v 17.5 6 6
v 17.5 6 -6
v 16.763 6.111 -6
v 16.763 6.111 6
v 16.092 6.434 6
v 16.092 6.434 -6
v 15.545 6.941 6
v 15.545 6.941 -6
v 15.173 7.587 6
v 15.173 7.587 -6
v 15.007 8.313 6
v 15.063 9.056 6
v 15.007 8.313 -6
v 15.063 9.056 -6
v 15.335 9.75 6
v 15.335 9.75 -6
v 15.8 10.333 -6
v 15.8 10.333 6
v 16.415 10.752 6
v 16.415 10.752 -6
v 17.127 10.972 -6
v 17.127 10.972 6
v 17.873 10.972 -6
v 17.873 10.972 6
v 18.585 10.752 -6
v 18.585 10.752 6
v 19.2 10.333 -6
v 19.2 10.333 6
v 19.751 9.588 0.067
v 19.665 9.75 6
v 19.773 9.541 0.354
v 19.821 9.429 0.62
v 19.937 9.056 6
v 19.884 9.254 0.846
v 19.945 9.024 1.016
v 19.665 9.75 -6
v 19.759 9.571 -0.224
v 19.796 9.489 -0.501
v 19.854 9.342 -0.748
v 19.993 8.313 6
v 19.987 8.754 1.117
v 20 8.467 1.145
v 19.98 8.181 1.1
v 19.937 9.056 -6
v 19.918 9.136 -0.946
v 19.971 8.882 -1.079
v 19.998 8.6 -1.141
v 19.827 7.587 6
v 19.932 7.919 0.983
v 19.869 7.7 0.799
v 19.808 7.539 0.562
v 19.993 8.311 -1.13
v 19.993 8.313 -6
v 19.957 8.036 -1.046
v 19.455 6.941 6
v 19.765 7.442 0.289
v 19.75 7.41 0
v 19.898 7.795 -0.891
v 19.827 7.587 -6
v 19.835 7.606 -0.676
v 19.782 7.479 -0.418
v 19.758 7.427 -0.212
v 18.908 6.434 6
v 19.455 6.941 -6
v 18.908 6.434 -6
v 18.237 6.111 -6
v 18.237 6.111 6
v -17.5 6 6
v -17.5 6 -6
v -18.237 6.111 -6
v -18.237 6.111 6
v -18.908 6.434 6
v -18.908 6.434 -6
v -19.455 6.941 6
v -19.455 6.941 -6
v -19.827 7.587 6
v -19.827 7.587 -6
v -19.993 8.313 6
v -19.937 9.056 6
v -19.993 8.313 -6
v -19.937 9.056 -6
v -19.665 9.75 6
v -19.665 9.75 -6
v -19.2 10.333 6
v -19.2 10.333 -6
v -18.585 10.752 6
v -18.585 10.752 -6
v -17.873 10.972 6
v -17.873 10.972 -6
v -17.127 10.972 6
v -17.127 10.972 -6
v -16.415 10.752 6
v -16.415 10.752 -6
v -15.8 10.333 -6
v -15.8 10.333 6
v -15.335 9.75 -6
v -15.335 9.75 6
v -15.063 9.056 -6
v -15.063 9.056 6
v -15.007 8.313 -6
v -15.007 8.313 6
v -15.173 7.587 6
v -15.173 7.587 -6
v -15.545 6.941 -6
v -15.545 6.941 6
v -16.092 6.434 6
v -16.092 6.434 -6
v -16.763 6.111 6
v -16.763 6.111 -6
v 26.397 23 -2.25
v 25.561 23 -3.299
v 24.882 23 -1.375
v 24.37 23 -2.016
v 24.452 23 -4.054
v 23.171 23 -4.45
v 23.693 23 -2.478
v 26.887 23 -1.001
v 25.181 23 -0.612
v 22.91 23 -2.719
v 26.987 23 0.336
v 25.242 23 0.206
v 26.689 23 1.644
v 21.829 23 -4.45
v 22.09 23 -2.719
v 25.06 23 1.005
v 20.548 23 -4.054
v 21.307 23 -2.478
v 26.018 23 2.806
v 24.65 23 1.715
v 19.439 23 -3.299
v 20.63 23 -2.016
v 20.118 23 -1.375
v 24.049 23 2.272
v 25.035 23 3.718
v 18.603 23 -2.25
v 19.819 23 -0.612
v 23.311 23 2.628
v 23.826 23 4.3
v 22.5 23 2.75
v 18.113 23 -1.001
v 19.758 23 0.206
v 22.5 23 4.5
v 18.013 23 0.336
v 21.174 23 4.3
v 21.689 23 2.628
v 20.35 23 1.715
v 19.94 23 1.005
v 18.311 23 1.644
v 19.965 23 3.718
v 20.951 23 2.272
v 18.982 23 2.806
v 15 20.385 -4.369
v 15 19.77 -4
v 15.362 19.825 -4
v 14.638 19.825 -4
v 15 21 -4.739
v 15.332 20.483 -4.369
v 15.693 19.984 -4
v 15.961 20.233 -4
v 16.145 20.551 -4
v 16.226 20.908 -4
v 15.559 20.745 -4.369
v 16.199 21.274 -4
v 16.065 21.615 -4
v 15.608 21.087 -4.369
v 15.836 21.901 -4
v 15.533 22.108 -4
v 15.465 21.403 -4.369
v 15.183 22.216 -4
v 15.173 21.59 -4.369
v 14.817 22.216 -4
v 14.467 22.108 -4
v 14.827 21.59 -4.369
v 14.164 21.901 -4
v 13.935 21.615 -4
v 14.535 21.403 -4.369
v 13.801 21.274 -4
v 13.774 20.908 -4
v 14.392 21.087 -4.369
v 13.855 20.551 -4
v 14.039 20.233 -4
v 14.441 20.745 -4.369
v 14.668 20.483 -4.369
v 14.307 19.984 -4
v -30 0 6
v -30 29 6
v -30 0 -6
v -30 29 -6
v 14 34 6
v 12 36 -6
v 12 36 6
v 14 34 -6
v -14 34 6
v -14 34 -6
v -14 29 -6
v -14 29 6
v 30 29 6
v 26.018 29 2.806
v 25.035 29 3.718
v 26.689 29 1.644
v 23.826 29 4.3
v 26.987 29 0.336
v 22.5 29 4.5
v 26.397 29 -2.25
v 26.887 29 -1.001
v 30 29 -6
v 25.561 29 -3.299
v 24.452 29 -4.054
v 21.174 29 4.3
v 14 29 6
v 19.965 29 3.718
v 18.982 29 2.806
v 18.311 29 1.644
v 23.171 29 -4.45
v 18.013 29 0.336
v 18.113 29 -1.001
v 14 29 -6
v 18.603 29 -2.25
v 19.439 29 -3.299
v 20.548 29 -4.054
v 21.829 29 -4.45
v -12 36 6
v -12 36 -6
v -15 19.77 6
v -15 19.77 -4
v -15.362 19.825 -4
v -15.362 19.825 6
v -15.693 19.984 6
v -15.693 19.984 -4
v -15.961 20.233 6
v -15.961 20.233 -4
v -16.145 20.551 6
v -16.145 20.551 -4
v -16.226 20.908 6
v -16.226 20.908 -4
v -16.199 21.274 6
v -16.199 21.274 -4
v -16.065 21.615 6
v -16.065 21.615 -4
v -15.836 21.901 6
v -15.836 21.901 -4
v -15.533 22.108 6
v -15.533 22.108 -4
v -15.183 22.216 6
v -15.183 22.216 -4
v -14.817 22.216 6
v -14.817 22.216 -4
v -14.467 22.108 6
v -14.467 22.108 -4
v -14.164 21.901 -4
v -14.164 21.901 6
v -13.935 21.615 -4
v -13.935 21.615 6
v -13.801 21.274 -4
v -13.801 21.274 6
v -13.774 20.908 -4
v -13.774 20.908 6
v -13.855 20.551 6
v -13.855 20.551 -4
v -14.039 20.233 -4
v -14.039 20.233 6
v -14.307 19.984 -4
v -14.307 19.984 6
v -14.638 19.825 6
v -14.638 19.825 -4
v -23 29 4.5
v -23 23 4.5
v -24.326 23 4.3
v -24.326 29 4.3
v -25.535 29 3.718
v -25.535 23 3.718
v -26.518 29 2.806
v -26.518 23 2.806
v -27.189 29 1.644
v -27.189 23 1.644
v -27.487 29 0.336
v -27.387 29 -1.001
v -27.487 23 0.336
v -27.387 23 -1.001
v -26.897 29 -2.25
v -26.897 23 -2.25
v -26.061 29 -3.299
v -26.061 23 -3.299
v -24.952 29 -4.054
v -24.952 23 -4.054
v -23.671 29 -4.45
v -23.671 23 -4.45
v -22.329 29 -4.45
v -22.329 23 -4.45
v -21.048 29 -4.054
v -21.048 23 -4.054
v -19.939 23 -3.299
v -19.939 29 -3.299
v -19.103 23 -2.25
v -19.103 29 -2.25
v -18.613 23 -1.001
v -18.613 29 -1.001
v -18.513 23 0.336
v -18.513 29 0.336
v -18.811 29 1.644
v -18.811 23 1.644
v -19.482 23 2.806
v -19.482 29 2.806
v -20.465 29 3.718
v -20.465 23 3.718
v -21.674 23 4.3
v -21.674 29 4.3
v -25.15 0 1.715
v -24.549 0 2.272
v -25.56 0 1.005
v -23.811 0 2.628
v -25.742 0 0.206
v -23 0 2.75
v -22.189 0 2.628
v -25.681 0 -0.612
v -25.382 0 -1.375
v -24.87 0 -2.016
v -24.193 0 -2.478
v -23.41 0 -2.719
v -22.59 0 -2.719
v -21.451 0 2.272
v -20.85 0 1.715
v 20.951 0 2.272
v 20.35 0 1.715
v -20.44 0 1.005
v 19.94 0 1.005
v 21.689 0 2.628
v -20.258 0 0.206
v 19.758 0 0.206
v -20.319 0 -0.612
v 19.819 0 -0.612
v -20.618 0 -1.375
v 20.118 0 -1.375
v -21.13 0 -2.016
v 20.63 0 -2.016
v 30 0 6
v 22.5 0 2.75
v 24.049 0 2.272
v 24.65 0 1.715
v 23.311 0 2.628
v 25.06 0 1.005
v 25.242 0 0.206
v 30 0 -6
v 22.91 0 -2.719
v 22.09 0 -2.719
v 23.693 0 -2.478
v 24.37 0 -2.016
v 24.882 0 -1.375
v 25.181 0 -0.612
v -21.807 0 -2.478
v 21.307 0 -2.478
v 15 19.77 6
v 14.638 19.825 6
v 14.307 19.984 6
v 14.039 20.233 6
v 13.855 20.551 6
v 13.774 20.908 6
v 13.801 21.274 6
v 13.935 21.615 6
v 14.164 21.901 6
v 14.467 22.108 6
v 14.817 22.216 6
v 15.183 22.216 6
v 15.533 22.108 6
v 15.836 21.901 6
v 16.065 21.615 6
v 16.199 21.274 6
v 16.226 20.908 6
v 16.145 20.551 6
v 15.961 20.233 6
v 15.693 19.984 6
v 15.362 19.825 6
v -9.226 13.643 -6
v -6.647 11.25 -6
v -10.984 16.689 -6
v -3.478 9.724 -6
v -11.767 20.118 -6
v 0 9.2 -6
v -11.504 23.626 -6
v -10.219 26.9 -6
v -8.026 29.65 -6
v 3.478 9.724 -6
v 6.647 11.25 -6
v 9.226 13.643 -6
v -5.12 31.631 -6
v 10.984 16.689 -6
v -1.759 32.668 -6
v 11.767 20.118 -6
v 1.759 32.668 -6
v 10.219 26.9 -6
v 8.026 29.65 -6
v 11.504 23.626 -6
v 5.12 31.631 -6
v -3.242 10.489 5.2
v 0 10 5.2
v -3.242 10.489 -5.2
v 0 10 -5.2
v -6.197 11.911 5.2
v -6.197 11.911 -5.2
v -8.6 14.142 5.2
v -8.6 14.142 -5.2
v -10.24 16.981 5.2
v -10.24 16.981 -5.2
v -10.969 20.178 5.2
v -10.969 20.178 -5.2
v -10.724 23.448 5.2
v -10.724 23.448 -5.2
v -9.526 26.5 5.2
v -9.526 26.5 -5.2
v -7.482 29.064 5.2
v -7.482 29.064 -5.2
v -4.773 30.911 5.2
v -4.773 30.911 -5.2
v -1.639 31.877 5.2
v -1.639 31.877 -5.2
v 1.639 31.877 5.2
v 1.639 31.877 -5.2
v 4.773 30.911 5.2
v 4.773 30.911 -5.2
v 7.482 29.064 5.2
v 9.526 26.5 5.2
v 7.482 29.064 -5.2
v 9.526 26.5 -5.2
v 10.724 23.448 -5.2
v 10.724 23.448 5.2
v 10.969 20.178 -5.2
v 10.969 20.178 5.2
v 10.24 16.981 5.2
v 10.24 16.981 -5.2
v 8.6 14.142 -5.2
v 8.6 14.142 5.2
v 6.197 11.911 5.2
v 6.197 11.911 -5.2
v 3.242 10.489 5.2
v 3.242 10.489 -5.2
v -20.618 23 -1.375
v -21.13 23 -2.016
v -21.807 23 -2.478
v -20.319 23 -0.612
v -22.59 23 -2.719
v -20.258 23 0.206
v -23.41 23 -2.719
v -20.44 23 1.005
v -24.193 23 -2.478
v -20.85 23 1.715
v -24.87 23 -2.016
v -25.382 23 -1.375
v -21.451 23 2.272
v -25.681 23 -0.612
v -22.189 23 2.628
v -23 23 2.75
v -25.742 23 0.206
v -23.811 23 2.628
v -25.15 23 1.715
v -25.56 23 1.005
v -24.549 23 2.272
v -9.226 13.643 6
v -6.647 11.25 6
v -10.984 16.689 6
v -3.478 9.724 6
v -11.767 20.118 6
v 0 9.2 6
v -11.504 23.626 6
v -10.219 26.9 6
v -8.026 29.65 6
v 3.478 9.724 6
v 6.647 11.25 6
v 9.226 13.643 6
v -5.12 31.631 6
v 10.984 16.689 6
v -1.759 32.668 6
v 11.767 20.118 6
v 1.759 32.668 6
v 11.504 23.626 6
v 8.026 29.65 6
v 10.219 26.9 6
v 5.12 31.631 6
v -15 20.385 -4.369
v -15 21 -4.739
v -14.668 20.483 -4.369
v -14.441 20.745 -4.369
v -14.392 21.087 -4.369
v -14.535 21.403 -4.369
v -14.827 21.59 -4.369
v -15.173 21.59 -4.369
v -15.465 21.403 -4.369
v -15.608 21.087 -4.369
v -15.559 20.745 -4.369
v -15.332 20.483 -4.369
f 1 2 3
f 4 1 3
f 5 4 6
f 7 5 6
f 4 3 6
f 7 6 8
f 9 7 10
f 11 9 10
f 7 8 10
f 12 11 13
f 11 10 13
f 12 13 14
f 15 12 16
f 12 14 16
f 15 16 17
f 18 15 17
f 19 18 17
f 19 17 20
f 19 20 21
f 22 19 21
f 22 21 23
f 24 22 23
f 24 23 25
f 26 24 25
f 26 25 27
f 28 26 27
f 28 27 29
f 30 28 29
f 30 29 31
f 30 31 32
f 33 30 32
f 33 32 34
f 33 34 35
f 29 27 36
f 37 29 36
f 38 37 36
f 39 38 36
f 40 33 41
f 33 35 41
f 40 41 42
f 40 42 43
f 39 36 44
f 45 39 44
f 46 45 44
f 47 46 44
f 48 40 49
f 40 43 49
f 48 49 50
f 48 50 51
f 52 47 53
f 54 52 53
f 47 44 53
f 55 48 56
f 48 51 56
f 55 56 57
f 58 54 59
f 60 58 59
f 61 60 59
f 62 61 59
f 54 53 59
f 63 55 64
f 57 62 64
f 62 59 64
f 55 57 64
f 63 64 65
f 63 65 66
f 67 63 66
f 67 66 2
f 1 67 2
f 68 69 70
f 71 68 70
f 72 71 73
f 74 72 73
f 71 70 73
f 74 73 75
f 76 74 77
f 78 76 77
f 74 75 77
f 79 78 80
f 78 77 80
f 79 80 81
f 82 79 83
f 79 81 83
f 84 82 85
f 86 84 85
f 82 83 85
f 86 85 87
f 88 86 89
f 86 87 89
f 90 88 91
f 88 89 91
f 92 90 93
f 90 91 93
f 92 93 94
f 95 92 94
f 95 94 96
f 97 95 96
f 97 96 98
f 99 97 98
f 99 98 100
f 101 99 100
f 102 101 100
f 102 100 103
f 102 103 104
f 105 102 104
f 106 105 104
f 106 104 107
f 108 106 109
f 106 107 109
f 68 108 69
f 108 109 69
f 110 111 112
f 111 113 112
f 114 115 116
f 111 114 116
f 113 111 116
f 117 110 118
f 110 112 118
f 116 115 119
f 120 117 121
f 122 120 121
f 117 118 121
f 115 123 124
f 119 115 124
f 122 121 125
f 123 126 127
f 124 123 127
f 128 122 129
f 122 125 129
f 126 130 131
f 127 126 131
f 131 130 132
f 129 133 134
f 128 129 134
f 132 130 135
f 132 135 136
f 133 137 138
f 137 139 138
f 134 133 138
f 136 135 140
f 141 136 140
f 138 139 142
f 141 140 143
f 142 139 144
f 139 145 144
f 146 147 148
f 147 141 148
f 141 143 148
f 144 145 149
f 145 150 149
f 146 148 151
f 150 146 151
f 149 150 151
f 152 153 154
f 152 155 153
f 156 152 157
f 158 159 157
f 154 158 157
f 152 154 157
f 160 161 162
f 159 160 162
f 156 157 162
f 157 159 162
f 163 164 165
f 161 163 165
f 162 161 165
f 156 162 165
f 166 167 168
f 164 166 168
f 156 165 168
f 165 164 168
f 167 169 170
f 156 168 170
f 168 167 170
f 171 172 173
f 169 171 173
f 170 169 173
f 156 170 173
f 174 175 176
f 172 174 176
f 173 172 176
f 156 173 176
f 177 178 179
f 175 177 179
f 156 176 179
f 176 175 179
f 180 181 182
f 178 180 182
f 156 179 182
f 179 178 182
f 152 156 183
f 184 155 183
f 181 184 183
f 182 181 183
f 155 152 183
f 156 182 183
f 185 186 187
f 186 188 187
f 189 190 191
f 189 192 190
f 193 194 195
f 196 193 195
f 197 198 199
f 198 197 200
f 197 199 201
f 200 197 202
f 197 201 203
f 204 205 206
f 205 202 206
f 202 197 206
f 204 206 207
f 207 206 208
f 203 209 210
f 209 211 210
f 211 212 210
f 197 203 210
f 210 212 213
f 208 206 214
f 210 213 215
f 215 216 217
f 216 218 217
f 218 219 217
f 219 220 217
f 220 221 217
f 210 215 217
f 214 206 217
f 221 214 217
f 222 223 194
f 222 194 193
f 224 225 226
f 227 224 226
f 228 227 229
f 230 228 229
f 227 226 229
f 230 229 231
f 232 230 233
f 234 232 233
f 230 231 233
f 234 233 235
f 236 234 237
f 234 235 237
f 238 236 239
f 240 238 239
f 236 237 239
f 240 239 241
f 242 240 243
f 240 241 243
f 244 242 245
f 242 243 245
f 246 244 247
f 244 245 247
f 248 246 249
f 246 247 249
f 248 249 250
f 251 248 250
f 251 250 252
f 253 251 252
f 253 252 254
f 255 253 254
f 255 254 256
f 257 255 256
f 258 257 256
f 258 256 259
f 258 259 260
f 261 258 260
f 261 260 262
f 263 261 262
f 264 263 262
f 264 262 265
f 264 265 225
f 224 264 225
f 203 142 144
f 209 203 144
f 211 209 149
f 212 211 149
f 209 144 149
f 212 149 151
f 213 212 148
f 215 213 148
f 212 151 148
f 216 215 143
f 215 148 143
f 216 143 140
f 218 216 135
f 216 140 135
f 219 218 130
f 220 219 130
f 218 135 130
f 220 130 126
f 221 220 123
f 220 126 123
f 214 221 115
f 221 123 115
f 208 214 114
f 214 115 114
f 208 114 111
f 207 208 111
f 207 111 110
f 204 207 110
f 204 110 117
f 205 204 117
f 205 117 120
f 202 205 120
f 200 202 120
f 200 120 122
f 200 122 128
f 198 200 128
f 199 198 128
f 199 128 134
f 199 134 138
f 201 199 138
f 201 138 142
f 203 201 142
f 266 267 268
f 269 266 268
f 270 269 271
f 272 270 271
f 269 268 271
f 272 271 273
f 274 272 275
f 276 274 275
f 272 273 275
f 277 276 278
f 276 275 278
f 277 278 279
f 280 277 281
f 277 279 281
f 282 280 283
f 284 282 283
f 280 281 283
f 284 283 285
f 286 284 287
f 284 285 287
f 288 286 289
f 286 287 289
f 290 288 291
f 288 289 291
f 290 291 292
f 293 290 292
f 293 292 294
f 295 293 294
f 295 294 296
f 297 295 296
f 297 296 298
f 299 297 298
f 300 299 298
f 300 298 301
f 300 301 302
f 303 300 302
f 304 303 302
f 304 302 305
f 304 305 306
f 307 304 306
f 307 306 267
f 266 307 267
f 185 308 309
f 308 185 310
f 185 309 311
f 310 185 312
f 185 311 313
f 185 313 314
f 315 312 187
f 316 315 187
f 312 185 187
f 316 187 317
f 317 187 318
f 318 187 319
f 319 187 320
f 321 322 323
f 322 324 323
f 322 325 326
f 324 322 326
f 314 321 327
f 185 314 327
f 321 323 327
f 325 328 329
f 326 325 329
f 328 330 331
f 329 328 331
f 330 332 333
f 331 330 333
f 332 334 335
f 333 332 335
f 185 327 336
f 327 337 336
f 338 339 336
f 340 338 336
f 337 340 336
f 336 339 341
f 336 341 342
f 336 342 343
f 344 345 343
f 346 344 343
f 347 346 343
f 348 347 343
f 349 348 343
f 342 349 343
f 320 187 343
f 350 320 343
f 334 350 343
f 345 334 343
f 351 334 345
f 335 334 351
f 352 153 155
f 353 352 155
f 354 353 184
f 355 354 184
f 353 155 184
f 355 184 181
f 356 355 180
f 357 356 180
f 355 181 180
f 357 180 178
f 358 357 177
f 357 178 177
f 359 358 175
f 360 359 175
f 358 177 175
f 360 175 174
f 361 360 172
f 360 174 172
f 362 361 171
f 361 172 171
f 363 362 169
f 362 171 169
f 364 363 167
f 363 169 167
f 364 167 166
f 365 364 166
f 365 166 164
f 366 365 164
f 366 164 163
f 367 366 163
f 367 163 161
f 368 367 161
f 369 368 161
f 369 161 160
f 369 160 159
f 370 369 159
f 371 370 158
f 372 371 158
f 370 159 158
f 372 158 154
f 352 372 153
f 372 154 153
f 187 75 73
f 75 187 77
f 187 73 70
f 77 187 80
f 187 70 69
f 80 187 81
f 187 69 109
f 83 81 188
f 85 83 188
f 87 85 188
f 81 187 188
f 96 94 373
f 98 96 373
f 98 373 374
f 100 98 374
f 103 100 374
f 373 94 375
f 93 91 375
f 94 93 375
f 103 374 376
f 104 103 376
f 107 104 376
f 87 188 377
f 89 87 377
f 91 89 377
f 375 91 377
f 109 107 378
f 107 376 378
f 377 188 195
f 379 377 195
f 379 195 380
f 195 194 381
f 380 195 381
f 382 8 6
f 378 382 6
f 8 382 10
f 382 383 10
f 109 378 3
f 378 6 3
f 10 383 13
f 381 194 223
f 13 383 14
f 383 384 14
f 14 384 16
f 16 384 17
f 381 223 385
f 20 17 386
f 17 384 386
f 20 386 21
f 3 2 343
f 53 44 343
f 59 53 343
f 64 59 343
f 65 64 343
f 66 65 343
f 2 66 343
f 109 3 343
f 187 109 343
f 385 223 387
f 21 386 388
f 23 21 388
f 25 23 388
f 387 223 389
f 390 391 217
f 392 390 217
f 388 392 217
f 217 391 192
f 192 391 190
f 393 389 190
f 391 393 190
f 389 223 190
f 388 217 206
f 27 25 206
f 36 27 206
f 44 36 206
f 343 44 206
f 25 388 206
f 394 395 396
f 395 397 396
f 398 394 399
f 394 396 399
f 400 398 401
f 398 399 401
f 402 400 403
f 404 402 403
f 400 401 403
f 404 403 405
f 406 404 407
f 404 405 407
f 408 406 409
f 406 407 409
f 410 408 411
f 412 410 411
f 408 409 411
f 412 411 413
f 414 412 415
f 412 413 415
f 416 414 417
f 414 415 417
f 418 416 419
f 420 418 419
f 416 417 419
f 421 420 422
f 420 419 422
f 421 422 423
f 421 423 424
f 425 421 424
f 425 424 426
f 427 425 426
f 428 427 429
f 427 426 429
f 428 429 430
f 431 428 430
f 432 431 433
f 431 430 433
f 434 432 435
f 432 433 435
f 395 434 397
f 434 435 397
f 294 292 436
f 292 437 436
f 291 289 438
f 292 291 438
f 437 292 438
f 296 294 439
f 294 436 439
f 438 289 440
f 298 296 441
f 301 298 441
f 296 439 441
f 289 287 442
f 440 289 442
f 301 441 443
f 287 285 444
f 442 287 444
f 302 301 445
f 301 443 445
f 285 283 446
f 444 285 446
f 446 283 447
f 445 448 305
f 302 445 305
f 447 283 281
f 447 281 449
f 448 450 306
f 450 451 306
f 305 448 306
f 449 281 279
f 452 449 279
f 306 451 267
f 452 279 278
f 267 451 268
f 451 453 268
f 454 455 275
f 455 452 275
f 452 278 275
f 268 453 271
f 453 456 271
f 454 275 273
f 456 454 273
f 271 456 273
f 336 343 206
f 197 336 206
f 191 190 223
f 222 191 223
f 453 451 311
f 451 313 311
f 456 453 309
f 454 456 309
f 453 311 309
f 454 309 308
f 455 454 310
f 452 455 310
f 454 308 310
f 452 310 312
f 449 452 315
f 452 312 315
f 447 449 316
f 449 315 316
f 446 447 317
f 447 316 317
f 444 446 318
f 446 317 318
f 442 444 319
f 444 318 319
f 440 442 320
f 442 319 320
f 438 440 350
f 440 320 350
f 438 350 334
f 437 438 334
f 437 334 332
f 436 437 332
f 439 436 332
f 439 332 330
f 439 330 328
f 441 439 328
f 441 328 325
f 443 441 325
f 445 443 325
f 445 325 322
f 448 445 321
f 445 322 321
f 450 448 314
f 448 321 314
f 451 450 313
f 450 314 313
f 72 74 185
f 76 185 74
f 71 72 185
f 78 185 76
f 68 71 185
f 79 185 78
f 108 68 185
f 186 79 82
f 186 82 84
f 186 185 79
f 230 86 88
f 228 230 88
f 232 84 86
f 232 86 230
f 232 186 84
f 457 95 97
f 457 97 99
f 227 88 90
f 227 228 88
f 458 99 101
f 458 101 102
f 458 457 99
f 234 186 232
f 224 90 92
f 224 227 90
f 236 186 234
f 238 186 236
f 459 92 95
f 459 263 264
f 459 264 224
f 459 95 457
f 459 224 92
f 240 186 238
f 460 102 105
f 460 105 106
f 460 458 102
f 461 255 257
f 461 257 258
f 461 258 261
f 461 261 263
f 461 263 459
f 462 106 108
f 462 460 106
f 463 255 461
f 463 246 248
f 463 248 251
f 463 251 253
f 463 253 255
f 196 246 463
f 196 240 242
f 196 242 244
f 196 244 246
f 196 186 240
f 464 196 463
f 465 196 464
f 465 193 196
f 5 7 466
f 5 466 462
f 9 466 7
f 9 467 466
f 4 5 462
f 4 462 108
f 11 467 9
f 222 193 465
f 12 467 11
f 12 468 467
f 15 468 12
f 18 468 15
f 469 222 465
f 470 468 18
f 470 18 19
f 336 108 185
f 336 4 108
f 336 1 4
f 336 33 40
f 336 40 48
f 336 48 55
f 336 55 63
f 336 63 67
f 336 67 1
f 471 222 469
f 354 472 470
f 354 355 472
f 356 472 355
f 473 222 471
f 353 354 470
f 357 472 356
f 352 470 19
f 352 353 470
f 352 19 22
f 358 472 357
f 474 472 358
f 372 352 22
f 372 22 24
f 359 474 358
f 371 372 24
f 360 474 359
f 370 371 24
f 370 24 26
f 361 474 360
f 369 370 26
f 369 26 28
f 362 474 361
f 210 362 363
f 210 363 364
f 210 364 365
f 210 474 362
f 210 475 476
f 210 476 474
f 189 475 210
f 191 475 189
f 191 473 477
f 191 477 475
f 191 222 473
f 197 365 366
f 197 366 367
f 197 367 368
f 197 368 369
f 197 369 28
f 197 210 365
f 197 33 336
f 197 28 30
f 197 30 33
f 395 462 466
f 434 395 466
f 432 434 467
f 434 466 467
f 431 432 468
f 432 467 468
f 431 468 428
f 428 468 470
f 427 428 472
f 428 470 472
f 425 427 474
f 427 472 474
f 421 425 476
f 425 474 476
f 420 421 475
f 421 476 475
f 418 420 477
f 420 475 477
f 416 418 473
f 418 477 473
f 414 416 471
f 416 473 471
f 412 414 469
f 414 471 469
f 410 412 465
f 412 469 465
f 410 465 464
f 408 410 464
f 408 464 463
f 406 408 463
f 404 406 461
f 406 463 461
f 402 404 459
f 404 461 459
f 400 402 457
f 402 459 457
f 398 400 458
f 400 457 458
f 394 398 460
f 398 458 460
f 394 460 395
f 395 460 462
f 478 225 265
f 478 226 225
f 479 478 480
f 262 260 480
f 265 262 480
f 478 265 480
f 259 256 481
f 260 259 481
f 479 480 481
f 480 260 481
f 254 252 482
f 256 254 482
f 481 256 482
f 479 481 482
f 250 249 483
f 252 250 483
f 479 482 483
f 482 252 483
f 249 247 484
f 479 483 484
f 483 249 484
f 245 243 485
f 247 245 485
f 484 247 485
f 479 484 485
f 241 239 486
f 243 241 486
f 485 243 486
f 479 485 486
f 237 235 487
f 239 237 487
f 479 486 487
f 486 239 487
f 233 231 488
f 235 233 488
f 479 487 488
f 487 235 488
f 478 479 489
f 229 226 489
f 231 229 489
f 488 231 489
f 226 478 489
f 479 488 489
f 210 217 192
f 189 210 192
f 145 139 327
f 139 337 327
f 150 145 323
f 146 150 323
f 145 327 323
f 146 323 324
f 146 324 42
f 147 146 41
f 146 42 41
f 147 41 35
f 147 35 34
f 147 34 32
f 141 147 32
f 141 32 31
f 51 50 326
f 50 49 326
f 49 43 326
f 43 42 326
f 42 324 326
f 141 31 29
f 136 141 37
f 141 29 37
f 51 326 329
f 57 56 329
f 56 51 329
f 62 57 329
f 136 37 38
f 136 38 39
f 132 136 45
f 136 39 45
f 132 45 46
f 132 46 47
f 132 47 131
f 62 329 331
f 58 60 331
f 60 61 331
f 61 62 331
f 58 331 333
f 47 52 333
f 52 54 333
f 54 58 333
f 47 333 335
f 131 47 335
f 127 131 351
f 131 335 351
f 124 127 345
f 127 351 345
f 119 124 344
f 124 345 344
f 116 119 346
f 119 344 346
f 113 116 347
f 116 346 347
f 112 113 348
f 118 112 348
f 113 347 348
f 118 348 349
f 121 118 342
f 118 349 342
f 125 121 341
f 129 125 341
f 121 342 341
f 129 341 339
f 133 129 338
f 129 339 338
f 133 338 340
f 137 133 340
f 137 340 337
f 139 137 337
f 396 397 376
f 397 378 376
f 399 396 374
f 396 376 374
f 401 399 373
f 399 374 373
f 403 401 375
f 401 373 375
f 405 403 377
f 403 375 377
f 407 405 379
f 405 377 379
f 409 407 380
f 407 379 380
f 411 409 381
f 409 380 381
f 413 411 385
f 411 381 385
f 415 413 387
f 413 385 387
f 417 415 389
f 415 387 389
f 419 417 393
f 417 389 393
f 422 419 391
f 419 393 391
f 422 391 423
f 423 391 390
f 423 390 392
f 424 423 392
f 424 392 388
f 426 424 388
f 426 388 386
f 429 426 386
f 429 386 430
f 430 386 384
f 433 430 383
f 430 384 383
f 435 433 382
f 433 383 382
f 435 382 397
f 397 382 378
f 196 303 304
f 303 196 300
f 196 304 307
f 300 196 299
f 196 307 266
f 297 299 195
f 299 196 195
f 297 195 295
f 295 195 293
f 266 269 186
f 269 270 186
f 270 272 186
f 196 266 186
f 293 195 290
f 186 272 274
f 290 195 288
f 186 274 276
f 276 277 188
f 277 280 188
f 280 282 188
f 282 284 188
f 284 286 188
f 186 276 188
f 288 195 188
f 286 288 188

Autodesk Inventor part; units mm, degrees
ref_plane "YZ Plane" through (0, 0, 0) normal (1, 0, 0) x (0, 1, 0)
ref_plane "XZ Plane" through (0, 0, 0) normal (0, 1, 0) x (-1, 0, 0)
ref_plane "XY Plane" through (0, 0, 0) normal (0, 0, 1) x (1, 0, 0)
sketch "Sketch1" plane through (0, 0, 0) normal (0, 0, 1) x (1, 0, 0)
  line L0 (-30, 0) -> (30, 0)
  line L1 (30, 0) -> (30, 29)
  line L2 (30, 29) -> (14, 29)
  line L3 (14, 29) -> (14, 36)
  line L4 (14, 36) -> (-14, 36)
  line L5 (-14, 36) -> (-14, 29)
  line L6 (-14, 29) -> (-30, 29)
  line L7 (-30, 29) -> (-30, 0)
  point P0 (0, 0)
  point P1 (0, 0)
  dimension "d0" = 60
  dimension "d1" = 36
  dimension "d2" = 7
  dimension "d3" = 28
extrude "Extrusion1" add sketch "Sketch1" along normal mid plane 12
sketch "Sketch2" plane through (0, 0, 6) normal (0, 0, 1) x (1, 0, 0)
  line L0 (-30, 0) -> (30, 0) projected
  point P0 (0, 0)
  point P1 (0, 21)
  point P2 (0, 0)
  dimension "d6" = 21
hole "Hole1" at (0, 21, 6) direction (0, 0, -1) diameter 22 end through all
chamfer "Chamfer1" distance 0.8 angle 45 2 edges at (0, 32, 6) (0, 32, -6)
chamfer "Chamfer2" distance 2 angle 45 2 edges at (-14, 36, 0) (14, 36, 0)
sketch "Sketch3" plane through (-30, 29, 6) normal (0, 1, 0) x (1, 0, 0)
  line L0 (0, 12) -> (0, 0) projected
  line L1 (60, 12) -> (60, 0) projected
  point P0 (30, 6)
  point P1 (7, 6)
  point P2 (52.5, 6)
  dimension "d20" = 45.5
  dimension "d21" = 7
  dimension "d22" = 7.5
hole "Hole2" at (-23, 29, 0) at (22.5, 29, 0) direction (0, -1, 0) diameter 5.5 end through all counterbore diameter 9 counterbore depth 6
sketch "Sketch4" plane through (0, 0, 6) normal (0, 0, 1) x (1, 0, 0)
  line L0 (-30, 0) -> (30, 0) projected
  line L1 (-30, 29) -> (-30, 0) projected
  point P0 (0, 0)
  point P1 (-17.5, 8.5)
  point P2 (17.5, 8.5)
  dimension "d30" = 35
  dimension "d31" = 8.5
  dimension "d32" = 12.5
hole "Hole3" at (-17.5, 8.5, 6) at (17.5, 8.5, 6) direction (0, 0, -1) diameter 5 end through all
sketch "Sketch5" plane through (0, 0, 6) normal (0, 0, 1) x (1, 0, 0)
  circle A0 centre (0, 21) radius 11 projected
  circle A1 centre (0, 21) radius 11 projected
  point P0 (0, 0)
  point P1 (-15, 21)
  point P2 (15, 21)
  dimension "d40" = 30
  dimension "d41" = 15
hole "Hole4" at (-15, 21, 6) at (15, 21, 6) direction (0, 0, -1) diameter 2.459 depth 10 tip angle 118 thread size "M3x0.5" designation "M3" class "6H" standard "ISO Metric profile"
equation "\"d41\" = 0.5 * d40"
properties part number "Lagerbock_Loslager" material "Aluminum 6061"
